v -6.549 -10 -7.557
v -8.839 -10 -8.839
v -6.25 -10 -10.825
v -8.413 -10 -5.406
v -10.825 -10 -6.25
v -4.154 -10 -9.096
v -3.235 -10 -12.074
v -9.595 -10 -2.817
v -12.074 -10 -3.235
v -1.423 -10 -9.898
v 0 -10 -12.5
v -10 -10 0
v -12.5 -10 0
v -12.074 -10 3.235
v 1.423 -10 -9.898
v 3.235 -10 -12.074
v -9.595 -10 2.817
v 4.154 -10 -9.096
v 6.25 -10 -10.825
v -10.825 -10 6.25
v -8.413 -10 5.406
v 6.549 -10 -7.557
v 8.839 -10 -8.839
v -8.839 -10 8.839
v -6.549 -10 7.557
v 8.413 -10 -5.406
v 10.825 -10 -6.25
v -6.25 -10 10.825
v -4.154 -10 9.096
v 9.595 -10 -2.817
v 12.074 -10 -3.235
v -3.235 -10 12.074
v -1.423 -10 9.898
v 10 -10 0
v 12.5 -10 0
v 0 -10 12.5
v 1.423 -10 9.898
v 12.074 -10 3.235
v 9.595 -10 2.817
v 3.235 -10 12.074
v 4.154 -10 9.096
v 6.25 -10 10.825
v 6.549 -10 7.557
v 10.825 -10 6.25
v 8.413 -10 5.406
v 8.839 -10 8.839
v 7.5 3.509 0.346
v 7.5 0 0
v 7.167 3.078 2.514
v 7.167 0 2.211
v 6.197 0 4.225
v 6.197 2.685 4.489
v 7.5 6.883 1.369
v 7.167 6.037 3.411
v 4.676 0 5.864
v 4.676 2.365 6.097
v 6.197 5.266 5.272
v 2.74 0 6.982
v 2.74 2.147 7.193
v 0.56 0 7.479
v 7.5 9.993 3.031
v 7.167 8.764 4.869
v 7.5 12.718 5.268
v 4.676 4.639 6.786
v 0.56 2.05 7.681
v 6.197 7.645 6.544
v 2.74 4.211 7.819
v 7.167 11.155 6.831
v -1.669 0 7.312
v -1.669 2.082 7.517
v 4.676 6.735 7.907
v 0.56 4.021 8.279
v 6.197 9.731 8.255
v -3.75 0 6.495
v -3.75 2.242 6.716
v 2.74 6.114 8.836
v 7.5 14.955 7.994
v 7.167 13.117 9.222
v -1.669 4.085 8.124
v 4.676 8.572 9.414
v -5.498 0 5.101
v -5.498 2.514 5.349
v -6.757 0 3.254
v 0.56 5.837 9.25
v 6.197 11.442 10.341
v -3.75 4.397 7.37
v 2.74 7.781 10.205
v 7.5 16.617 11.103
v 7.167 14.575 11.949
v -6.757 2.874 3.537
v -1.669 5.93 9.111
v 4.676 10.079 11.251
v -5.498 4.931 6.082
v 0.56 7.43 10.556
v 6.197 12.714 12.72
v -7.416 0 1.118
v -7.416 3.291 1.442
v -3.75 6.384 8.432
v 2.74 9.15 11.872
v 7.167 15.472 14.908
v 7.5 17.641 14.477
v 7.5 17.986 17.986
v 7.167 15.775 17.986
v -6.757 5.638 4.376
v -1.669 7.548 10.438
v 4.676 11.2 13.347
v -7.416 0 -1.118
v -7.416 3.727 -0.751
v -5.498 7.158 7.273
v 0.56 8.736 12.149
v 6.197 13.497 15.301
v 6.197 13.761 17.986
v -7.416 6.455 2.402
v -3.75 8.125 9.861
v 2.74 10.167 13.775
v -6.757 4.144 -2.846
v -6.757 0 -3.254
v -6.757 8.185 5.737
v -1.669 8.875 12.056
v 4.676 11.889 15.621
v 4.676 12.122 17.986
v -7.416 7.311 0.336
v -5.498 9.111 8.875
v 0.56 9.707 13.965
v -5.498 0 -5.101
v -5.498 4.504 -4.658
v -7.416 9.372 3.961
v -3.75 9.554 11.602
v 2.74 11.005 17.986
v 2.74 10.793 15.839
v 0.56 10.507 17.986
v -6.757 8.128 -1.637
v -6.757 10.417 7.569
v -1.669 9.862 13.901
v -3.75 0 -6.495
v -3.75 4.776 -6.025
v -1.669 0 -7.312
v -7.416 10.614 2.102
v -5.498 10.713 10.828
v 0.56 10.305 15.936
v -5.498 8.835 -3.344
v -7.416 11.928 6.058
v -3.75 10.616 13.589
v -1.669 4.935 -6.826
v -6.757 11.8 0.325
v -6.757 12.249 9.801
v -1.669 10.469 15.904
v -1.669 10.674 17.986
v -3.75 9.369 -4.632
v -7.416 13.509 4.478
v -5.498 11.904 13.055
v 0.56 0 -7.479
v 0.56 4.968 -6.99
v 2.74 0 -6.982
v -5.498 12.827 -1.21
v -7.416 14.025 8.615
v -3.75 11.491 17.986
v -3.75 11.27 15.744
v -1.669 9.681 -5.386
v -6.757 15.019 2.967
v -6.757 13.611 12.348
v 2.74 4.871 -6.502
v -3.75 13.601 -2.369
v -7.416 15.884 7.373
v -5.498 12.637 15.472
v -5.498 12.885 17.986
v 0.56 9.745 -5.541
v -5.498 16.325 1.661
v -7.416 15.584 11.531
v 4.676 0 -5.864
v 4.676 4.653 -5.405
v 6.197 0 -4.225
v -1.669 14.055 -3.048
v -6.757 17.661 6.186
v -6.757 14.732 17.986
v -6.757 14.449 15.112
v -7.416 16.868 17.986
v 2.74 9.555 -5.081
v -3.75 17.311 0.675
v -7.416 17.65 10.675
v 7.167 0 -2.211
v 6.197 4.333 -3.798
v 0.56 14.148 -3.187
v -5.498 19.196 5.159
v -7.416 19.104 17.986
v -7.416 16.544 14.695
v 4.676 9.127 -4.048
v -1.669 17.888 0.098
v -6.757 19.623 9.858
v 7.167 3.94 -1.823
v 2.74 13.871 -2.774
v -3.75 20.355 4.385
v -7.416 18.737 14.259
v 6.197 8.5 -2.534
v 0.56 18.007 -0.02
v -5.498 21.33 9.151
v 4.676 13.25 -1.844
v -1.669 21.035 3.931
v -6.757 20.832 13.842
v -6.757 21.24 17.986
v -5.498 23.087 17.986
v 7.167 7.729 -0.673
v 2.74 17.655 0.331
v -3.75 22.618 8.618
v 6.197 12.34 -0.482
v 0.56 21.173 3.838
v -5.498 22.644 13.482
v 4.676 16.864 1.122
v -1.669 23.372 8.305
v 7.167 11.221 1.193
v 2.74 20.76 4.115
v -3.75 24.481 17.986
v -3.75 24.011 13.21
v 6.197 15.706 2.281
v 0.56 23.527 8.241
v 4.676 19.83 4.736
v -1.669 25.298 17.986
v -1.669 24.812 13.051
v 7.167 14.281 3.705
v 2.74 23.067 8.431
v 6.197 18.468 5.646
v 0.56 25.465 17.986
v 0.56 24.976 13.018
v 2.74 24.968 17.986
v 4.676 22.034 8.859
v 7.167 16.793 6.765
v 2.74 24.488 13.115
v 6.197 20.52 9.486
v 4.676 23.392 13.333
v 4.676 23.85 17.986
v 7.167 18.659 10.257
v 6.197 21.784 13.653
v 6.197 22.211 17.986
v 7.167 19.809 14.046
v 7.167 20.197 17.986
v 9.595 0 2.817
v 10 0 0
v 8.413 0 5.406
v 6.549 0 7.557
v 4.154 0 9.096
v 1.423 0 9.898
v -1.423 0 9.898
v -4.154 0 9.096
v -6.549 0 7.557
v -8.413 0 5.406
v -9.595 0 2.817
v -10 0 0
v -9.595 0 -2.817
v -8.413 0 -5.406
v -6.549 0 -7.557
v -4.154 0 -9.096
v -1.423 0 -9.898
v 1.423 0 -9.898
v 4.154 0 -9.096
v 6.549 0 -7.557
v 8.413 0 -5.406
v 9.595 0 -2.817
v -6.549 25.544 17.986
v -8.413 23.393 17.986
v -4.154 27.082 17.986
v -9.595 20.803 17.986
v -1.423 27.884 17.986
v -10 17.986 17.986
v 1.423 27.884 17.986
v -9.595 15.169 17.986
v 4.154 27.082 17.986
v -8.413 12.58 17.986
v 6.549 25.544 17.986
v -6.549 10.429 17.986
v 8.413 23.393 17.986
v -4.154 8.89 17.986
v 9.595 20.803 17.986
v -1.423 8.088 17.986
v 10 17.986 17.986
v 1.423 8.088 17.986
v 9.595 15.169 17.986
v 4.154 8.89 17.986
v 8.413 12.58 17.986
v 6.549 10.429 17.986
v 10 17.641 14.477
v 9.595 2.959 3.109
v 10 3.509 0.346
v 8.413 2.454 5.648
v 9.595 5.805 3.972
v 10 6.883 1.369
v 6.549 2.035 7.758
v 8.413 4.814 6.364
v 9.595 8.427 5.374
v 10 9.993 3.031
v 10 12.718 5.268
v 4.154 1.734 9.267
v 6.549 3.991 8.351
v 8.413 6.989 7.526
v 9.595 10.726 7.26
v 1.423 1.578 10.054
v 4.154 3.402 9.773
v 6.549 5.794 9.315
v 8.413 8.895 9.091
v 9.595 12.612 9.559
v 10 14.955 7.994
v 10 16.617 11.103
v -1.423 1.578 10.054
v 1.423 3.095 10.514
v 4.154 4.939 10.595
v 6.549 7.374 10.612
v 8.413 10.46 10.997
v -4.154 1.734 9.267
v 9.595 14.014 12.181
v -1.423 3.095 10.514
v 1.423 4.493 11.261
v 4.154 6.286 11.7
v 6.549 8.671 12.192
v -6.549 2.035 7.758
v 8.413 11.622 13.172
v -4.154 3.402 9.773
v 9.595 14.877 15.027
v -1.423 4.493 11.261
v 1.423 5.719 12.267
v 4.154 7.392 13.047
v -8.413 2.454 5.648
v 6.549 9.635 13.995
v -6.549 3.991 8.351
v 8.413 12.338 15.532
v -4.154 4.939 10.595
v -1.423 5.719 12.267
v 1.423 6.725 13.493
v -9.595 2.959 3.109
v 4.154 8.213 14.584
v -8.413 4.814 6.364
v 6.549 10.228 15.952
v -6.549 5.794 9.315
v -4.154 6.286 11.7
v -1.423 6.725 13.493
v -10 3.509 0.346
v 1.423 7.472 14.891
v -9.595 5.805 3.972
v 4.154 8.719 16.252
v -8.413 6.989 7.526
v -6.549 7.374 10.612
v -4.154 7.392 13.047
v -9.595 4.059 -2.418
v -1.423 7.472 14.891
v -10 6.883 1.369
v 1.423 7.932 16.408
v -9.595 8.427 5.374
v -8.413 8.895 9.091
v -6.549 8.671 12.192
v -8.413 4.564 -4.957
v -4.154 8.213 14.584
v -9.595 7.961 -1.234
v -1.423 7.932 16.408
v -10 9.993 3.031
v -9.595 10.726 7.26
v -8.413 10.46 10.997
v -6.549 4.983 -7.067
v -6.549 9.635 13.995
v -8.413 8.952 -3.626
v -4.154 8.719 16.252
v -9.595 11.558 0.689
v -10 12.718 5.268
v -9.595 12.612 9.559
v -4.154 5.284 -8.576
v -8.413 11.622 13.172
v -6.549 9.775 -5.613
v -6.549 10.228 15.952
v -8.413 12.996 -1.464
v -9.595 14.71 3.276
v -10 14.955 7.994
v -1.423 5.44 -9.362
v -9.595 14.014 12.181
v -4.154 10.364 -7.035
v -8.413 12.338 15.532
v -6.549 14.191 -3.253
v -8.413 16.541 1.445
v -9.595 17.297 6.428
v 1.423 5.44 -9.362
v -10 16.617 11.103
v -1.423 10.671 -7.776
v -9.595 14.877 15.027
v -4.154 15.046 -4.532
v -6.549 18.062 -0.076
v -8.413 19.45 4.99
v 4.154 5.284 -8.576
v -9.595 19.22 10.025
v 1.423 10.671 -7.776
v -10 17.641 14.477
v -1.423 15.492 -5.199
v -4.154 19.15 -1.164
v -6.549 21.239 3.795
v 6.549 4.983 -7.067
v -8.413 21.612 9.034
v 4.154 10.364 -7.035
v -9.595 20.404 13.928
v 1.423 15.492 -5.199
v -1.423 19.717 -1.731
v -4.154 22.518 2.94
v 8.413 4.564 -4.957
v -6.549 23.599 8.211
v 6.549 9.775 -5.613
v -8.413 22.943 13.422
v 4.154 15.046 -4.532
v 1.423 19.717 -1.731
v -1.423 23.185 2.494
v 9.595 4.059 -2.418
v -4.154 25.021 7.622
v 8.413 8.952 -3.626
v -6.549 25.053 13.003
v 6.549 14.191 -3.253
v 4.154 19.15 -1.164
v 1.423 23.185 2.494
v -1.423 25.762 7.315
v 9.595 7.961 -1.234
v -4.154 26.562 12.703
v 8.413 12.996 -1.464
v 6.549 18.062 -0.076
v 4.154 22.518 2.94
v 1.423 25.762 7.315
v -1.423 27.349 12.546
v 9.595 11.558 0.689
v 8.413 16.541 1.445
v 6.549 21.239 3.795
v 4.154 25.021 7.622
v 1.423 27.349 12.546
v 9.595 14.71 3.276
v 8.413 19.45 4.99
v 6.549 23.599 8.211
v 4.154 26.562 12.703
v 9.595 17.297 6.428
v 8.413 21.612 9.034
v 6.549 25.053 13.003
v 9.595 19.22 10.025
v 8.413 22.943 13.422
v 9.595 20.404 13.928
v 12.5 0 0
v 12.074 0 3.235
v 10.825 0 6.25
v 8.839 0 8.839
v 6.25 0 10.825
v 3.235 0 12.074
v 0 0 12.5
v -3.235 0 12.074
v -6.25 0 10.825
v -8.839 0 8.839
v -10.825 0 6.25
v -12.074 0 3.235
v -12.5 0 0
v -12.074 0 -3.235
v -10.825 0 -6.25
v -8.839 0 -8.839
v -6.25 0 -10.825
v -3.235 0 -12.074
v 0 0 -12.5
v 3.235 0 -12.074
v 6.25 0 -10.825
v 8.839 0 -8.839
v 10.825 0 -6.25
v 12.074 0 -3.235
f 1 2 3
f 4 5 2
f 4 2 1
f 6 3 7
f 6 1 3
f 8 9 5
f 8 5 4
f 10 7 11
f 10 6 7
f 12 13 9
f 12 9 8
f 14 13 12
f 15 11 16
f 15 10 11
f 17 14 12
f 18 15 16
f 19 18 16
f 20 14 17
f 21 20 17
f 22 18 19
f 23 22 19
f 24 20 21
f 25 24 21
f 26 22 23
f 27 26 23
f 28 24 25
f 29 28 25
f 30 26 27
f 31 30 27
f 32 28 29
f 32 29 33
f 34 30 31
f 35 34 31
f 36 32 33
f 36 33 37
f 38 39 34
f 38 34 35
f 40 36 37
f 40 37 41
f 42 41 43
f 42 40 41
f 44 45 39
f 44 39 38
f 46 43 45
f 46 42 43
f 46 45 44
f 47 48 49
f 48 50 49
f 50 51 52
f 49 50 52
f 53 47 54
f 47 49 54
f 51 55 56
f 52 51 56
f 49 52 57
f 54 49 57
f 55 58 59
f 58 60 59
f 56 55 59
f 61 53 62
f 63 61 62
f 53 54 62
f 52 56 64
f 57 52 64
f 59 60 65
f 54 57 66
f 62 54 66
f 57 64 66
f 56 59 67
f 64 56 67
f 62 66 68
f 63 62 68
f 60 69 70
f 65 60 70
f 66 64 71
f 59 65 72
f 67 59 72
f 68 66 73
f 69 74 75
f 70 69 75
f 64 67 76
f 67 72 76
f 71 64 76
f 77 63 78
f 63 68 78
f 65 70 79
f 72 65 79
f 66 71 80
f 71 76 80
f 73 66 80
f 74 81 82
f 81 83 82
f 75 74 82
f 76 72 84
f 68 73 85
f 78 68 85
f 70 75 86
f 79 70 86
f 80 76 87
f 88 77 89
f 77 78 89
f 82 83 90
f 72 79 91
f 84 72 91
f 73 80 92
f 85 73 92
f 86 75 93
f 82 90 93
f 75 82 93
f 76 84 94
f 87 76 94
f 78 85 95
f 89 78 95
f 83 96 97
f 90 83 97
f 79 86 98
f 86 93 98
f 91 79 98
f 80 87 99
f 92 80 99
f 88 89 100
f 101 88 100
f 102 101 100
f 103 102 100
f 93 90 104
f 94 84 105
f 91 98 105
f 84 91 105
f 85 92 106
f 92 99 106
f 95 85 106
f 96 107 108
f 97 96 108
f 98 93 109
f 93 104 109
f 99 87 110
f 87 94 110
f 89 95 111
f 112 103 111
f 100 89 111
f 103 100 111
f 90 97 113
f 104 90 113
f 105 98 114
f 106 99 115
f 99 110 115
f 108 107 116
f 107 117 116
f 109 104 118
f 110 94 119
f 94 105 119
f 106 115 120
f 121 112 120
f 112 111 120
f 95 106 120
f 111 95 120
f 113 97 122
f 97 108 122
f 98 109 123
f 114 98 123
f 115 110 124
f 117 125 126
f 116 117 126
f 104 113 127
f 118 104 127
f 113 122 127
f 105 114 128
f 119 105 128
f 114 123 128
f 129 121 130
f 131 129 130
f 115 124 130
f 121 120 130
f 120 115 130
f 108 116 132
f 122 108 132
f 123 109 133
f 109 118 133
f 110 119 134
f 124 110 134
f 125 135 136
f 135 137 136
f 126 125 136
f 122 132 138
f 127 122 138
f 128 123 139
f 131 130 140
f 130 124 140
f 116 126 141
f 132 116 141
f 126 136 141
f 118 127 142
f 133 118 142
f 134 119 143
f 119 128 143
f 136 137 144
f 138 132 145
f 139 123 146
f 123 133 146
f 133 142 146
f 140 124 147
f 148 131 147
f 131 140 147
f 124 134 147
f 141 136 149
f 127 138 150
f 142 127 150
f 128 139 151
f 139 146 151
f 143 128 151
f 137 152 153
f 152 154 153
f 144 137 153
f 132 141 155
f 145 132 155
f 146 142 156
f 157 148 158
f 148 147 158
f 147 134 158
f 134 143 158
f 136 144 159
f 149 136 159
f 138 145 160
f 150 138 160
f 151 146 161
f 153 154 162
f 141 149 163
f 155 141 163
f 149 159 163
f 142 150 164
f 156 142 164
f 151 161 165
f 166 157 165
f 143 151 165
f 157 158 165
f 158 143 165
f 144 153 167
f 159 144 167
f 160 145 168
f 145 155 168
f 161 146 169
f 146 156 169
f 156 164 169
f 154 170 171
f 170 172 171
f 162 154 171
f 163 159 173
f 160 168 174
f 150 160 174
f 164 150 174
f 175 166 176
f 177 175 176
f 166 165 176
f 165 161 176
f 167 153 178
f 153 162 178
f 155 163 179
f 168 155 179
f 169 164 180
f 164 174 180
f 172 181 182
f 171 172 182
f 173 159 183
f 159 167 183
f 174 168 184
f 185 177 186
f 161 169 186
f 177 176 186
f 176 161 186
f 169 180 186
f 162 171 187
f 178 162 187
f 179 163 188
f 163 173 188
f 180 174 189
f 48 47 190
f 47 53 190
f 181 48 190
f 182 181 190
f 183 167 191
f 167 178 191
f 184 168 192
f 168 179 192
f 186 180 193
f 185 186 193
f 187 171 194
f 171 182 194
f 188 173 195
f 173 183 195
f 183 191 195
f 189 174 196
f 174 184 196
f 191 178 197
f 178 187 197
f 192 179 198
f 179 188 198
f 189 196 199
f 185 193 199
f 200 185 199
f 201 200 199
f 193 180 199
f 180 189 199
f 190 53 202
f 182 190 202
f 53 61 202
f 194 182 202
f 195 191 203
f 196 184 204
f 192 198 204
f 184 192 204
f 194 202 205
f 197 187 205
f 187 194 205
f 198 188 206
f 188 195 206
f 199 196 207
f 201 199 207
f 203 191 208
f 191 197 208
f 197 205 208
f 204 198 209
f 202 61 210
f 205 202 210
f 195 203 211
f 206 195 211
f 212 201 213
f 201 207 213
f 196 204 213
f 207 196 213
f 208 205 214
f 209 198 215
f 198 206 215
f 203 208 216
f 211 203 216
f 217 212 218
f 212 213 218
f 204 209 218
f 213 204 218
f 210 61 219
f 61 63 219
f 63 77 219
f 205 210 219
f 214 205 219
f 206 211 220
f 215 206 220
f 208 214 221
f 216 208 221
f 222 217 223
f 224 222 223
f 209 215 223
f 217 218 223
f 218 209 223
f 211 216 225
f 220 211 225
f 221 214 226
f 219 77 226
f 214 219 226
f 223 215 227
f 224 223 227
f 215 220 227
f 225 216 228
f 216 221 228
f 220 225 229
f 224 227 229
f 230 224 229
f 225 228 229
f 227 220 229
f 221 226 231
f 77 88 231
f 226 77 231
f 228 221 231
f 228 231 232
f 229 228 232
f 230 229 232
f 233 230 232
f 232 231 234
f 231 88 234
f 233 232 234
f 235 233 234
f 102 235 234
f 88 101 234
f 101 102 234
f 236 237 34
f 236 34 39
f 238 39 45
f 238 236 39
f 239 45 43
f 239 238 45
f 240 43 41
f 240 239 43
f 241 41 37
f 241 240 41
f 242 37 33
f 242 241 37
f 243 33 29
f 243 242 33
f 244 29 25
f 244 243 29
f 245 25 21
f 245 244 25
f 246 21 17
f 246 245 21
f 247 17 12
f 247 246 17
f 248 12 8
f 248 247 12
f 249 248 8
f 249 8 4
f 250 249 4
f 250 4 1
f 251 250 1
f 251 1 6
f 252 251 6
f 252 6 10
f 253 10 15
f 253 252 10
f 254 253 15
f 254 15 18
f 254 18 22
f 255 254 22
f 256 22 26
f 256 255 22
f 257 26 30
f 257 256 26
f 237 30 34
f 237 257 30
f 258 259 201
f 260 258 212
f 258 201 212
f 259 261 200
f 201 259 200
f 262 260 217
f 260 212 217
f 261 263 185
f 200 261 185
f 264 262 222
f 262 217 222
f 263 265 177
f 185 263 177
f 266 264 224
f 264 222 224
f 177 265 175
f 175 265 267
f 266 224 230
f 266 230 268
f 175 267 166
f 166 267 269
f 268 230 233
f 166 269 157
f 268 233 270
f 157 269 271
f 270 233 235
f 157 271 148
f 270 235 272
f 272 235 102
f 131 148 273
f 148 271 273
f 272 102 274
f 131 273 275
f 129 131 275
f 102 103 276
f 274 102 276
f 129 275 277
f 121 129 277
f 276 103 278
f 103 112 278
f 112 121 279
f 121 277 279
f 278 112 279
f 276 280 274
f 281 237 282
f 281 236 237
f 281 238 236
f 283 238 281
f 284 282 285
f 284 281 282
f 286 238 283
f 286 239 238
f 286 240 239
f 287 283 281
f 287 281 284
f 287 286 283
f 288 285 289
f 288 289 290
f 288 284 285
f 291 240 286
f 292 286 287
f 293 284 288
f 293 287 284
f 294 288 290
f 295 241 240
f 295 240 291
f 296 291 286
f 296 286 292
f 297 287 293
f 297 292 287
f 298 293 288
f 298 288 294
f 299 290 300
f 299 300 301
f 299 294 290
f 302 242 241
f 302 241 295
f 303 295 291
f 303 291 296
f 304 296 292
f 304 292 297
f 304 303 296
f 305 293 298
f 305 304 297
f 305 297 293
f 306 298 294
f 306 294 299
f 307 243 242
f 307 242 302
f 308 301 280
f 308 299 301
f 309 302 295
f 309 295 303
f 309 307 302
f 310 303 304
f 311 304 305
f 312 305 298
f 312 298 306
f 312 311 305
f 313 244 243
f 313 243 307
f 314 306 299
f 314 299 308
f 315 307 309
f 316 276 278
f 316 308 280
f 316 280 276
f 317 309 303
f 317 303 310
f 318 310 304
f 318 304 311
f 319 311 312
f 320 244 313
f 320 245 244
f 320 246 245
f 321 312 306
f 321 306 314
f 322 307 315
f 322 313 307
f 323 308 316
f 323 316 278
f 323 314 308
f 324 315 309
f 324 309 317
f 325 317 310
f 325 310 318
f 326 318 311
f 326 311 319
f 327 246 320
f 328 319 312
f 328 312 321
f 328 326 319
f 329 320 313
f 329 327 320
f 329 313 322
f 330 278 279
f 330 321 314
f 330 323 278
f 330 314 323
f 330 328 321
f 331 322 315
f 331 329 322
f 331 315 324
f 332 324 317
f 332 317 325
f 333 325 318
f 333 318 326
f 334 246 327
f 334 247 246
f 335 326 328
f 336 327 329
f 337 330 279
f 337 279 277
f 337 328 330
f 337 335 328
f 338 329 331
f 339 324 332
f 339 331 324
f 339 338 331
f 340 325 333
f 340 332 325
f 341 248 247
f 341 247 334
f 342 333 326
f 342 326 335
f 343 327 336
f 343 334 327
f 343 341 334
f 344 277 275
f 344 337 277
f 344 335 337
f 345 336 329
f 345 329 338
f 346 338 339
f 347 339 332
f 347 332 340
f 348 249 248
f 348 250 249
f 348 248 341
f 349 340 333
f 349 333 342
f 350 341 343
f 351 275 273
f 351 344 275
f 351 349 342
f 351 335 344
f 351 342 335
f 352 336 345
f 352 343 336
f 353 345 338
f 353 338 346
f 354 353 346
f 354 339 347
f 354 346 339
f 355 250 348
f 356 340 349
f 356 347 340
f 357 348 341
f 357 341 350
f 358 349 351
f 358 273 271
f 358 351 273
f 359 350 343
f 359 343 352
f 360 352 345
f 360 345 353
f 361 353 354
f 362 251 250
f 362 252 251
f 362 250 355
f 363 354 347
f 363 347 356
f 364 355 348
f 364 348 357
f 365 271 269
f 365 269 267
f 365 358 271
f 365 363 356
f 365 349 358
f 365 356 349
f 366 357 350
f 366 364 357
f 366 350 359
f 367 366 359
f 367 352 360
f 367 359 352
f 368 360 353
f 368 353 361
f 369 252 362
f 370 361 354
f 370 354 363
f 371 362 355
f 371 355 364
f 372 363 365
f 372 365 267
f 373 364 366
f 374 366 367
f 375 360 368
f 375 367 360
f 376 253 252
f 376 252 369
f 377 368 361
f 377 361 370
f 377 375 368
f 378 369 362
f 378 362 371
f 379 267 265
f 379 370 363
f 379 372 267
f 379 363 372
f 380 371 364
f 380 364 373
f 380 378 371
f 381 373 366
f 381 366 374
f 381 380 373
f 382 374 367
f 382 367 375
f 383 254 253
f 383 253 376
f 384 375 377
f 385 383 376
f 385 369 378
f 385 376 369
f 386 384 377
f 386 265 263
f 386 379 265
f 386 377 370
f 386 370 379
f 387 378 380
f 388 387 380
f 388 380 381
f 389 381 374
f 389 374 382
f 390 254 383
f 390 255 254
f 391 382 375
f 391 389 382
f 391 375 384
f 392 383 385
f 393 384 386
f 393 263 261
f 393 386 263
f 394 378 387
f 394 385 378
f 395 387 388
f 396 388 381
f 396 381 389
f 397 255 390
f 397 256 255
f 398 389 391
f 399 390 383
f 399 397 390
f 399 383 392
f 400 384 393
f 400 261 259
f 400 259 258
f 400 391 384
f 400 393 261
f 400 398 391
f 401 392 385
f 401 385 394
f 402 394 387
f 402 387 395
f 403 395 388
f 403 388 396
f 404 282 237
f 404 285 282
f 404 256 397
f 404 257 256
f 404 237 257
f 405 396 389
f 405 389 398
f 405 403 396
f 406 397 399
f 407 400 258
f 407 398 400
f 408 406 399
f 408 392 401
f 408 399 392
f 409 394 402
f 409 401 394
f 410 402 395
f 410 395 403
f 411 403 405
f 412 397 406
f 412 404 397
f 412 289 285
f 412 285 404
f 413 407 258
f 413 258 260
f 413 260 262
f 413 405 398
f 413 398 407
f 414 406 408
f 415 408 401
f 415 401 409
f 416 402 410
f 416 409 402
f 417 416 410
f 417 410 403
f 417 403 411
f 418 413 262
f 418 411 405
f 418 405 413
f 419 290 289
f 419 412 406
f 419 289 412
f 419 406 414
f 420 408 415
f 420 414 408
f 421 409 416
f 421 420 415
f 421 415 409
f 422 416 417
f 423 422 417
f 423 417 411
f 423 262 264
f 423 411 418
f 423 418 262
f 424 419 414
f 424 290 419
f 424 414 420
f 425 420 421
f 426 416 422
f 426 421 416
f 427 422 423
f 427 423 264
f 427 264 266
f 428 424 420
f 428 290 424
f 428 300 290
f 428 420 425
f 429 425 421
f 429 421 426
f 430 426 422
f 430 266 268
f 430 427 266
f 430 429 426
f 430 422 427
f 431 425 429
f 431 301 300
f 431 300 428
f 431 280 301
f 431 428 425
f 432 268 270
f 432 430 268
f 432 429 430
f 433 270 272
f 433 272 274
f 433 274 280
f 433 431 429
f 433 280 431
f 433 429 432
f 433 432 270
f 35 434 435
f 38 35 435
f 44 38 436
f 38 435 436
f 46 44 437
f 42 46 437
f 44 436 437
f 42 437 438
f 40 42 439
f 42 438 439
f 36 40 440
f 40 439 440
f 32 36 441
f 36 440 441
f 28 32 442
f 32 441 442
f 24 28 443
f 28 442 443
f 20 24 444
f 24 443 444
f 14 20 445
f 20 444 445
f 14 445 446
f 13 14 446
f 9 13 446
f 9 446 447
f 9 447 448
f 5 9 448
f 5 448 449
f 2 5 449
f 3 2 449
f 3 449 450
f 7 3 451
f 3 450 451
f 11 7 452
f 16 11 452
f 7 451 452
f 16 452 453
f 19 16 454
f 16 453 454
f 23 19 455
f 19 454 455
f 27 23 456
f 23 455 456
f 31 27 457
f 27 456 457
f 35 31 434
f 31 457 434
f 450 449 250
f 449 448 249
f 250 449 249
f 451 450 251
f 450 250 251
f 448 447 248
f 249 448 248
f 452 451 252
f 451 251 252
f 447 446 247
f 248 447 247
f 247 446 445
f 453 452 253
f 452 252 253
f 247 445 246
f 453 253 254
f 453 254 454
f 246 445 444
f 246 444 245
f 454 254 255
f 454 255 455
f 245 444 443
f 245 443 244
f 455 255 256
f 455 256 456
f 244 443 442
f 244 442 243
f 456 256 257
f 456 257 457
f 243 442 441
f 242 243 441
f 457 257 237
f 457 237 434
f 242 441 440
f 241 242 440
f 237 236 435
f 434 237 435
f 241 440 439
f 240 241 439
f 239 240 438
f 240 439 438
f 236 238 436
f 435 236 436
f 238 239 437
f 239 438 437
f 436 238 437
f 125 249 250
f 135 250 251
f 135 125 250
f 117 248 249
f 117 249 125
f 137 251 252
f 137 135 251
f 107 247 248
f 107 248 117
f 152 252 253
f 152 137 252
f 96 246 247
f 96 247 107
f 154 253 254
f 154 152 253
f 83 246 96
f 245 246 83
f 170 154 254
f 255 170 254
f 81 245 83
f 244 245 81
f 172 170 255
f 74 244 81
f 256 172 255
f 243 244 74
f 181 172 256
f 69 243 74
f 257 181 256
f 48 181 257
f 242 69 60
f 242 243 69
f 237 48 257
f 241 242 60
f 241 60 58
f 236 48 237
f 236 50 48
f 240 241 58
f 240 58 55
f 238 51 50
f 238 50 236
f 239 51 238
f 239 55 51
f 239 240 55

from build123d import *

# Parameters (mm, degrees)
F0_R     = 10
F0_R_2   = 7.5
F1_ANGLE = 90
F2_R     = 12.5
F2_R_2   = 10
F3_DEPTH = 10


with BuildPart() as f1:
    # F0 (on Front) → F1 (revolve)
    with BuildSketch(Plane.XZ):
        Circle(F0_R)
        Circle(F0_R_2, mode=Mode.SUBTRACT)
    revolve(axis=Axis((7.680556, 0, 17.986111), (1, 0, 0)), revolution_arc=F1_ANGLE)

    # F2 (on face) → F3 (join)
    with BuildSketch(Plane.XZ):
        Circle(F2_R)
        Circle(F2_R_2, mode=Mode.SUBTRACT)
    extrude(amount=F3_DEPTH)


solid = f1.part
